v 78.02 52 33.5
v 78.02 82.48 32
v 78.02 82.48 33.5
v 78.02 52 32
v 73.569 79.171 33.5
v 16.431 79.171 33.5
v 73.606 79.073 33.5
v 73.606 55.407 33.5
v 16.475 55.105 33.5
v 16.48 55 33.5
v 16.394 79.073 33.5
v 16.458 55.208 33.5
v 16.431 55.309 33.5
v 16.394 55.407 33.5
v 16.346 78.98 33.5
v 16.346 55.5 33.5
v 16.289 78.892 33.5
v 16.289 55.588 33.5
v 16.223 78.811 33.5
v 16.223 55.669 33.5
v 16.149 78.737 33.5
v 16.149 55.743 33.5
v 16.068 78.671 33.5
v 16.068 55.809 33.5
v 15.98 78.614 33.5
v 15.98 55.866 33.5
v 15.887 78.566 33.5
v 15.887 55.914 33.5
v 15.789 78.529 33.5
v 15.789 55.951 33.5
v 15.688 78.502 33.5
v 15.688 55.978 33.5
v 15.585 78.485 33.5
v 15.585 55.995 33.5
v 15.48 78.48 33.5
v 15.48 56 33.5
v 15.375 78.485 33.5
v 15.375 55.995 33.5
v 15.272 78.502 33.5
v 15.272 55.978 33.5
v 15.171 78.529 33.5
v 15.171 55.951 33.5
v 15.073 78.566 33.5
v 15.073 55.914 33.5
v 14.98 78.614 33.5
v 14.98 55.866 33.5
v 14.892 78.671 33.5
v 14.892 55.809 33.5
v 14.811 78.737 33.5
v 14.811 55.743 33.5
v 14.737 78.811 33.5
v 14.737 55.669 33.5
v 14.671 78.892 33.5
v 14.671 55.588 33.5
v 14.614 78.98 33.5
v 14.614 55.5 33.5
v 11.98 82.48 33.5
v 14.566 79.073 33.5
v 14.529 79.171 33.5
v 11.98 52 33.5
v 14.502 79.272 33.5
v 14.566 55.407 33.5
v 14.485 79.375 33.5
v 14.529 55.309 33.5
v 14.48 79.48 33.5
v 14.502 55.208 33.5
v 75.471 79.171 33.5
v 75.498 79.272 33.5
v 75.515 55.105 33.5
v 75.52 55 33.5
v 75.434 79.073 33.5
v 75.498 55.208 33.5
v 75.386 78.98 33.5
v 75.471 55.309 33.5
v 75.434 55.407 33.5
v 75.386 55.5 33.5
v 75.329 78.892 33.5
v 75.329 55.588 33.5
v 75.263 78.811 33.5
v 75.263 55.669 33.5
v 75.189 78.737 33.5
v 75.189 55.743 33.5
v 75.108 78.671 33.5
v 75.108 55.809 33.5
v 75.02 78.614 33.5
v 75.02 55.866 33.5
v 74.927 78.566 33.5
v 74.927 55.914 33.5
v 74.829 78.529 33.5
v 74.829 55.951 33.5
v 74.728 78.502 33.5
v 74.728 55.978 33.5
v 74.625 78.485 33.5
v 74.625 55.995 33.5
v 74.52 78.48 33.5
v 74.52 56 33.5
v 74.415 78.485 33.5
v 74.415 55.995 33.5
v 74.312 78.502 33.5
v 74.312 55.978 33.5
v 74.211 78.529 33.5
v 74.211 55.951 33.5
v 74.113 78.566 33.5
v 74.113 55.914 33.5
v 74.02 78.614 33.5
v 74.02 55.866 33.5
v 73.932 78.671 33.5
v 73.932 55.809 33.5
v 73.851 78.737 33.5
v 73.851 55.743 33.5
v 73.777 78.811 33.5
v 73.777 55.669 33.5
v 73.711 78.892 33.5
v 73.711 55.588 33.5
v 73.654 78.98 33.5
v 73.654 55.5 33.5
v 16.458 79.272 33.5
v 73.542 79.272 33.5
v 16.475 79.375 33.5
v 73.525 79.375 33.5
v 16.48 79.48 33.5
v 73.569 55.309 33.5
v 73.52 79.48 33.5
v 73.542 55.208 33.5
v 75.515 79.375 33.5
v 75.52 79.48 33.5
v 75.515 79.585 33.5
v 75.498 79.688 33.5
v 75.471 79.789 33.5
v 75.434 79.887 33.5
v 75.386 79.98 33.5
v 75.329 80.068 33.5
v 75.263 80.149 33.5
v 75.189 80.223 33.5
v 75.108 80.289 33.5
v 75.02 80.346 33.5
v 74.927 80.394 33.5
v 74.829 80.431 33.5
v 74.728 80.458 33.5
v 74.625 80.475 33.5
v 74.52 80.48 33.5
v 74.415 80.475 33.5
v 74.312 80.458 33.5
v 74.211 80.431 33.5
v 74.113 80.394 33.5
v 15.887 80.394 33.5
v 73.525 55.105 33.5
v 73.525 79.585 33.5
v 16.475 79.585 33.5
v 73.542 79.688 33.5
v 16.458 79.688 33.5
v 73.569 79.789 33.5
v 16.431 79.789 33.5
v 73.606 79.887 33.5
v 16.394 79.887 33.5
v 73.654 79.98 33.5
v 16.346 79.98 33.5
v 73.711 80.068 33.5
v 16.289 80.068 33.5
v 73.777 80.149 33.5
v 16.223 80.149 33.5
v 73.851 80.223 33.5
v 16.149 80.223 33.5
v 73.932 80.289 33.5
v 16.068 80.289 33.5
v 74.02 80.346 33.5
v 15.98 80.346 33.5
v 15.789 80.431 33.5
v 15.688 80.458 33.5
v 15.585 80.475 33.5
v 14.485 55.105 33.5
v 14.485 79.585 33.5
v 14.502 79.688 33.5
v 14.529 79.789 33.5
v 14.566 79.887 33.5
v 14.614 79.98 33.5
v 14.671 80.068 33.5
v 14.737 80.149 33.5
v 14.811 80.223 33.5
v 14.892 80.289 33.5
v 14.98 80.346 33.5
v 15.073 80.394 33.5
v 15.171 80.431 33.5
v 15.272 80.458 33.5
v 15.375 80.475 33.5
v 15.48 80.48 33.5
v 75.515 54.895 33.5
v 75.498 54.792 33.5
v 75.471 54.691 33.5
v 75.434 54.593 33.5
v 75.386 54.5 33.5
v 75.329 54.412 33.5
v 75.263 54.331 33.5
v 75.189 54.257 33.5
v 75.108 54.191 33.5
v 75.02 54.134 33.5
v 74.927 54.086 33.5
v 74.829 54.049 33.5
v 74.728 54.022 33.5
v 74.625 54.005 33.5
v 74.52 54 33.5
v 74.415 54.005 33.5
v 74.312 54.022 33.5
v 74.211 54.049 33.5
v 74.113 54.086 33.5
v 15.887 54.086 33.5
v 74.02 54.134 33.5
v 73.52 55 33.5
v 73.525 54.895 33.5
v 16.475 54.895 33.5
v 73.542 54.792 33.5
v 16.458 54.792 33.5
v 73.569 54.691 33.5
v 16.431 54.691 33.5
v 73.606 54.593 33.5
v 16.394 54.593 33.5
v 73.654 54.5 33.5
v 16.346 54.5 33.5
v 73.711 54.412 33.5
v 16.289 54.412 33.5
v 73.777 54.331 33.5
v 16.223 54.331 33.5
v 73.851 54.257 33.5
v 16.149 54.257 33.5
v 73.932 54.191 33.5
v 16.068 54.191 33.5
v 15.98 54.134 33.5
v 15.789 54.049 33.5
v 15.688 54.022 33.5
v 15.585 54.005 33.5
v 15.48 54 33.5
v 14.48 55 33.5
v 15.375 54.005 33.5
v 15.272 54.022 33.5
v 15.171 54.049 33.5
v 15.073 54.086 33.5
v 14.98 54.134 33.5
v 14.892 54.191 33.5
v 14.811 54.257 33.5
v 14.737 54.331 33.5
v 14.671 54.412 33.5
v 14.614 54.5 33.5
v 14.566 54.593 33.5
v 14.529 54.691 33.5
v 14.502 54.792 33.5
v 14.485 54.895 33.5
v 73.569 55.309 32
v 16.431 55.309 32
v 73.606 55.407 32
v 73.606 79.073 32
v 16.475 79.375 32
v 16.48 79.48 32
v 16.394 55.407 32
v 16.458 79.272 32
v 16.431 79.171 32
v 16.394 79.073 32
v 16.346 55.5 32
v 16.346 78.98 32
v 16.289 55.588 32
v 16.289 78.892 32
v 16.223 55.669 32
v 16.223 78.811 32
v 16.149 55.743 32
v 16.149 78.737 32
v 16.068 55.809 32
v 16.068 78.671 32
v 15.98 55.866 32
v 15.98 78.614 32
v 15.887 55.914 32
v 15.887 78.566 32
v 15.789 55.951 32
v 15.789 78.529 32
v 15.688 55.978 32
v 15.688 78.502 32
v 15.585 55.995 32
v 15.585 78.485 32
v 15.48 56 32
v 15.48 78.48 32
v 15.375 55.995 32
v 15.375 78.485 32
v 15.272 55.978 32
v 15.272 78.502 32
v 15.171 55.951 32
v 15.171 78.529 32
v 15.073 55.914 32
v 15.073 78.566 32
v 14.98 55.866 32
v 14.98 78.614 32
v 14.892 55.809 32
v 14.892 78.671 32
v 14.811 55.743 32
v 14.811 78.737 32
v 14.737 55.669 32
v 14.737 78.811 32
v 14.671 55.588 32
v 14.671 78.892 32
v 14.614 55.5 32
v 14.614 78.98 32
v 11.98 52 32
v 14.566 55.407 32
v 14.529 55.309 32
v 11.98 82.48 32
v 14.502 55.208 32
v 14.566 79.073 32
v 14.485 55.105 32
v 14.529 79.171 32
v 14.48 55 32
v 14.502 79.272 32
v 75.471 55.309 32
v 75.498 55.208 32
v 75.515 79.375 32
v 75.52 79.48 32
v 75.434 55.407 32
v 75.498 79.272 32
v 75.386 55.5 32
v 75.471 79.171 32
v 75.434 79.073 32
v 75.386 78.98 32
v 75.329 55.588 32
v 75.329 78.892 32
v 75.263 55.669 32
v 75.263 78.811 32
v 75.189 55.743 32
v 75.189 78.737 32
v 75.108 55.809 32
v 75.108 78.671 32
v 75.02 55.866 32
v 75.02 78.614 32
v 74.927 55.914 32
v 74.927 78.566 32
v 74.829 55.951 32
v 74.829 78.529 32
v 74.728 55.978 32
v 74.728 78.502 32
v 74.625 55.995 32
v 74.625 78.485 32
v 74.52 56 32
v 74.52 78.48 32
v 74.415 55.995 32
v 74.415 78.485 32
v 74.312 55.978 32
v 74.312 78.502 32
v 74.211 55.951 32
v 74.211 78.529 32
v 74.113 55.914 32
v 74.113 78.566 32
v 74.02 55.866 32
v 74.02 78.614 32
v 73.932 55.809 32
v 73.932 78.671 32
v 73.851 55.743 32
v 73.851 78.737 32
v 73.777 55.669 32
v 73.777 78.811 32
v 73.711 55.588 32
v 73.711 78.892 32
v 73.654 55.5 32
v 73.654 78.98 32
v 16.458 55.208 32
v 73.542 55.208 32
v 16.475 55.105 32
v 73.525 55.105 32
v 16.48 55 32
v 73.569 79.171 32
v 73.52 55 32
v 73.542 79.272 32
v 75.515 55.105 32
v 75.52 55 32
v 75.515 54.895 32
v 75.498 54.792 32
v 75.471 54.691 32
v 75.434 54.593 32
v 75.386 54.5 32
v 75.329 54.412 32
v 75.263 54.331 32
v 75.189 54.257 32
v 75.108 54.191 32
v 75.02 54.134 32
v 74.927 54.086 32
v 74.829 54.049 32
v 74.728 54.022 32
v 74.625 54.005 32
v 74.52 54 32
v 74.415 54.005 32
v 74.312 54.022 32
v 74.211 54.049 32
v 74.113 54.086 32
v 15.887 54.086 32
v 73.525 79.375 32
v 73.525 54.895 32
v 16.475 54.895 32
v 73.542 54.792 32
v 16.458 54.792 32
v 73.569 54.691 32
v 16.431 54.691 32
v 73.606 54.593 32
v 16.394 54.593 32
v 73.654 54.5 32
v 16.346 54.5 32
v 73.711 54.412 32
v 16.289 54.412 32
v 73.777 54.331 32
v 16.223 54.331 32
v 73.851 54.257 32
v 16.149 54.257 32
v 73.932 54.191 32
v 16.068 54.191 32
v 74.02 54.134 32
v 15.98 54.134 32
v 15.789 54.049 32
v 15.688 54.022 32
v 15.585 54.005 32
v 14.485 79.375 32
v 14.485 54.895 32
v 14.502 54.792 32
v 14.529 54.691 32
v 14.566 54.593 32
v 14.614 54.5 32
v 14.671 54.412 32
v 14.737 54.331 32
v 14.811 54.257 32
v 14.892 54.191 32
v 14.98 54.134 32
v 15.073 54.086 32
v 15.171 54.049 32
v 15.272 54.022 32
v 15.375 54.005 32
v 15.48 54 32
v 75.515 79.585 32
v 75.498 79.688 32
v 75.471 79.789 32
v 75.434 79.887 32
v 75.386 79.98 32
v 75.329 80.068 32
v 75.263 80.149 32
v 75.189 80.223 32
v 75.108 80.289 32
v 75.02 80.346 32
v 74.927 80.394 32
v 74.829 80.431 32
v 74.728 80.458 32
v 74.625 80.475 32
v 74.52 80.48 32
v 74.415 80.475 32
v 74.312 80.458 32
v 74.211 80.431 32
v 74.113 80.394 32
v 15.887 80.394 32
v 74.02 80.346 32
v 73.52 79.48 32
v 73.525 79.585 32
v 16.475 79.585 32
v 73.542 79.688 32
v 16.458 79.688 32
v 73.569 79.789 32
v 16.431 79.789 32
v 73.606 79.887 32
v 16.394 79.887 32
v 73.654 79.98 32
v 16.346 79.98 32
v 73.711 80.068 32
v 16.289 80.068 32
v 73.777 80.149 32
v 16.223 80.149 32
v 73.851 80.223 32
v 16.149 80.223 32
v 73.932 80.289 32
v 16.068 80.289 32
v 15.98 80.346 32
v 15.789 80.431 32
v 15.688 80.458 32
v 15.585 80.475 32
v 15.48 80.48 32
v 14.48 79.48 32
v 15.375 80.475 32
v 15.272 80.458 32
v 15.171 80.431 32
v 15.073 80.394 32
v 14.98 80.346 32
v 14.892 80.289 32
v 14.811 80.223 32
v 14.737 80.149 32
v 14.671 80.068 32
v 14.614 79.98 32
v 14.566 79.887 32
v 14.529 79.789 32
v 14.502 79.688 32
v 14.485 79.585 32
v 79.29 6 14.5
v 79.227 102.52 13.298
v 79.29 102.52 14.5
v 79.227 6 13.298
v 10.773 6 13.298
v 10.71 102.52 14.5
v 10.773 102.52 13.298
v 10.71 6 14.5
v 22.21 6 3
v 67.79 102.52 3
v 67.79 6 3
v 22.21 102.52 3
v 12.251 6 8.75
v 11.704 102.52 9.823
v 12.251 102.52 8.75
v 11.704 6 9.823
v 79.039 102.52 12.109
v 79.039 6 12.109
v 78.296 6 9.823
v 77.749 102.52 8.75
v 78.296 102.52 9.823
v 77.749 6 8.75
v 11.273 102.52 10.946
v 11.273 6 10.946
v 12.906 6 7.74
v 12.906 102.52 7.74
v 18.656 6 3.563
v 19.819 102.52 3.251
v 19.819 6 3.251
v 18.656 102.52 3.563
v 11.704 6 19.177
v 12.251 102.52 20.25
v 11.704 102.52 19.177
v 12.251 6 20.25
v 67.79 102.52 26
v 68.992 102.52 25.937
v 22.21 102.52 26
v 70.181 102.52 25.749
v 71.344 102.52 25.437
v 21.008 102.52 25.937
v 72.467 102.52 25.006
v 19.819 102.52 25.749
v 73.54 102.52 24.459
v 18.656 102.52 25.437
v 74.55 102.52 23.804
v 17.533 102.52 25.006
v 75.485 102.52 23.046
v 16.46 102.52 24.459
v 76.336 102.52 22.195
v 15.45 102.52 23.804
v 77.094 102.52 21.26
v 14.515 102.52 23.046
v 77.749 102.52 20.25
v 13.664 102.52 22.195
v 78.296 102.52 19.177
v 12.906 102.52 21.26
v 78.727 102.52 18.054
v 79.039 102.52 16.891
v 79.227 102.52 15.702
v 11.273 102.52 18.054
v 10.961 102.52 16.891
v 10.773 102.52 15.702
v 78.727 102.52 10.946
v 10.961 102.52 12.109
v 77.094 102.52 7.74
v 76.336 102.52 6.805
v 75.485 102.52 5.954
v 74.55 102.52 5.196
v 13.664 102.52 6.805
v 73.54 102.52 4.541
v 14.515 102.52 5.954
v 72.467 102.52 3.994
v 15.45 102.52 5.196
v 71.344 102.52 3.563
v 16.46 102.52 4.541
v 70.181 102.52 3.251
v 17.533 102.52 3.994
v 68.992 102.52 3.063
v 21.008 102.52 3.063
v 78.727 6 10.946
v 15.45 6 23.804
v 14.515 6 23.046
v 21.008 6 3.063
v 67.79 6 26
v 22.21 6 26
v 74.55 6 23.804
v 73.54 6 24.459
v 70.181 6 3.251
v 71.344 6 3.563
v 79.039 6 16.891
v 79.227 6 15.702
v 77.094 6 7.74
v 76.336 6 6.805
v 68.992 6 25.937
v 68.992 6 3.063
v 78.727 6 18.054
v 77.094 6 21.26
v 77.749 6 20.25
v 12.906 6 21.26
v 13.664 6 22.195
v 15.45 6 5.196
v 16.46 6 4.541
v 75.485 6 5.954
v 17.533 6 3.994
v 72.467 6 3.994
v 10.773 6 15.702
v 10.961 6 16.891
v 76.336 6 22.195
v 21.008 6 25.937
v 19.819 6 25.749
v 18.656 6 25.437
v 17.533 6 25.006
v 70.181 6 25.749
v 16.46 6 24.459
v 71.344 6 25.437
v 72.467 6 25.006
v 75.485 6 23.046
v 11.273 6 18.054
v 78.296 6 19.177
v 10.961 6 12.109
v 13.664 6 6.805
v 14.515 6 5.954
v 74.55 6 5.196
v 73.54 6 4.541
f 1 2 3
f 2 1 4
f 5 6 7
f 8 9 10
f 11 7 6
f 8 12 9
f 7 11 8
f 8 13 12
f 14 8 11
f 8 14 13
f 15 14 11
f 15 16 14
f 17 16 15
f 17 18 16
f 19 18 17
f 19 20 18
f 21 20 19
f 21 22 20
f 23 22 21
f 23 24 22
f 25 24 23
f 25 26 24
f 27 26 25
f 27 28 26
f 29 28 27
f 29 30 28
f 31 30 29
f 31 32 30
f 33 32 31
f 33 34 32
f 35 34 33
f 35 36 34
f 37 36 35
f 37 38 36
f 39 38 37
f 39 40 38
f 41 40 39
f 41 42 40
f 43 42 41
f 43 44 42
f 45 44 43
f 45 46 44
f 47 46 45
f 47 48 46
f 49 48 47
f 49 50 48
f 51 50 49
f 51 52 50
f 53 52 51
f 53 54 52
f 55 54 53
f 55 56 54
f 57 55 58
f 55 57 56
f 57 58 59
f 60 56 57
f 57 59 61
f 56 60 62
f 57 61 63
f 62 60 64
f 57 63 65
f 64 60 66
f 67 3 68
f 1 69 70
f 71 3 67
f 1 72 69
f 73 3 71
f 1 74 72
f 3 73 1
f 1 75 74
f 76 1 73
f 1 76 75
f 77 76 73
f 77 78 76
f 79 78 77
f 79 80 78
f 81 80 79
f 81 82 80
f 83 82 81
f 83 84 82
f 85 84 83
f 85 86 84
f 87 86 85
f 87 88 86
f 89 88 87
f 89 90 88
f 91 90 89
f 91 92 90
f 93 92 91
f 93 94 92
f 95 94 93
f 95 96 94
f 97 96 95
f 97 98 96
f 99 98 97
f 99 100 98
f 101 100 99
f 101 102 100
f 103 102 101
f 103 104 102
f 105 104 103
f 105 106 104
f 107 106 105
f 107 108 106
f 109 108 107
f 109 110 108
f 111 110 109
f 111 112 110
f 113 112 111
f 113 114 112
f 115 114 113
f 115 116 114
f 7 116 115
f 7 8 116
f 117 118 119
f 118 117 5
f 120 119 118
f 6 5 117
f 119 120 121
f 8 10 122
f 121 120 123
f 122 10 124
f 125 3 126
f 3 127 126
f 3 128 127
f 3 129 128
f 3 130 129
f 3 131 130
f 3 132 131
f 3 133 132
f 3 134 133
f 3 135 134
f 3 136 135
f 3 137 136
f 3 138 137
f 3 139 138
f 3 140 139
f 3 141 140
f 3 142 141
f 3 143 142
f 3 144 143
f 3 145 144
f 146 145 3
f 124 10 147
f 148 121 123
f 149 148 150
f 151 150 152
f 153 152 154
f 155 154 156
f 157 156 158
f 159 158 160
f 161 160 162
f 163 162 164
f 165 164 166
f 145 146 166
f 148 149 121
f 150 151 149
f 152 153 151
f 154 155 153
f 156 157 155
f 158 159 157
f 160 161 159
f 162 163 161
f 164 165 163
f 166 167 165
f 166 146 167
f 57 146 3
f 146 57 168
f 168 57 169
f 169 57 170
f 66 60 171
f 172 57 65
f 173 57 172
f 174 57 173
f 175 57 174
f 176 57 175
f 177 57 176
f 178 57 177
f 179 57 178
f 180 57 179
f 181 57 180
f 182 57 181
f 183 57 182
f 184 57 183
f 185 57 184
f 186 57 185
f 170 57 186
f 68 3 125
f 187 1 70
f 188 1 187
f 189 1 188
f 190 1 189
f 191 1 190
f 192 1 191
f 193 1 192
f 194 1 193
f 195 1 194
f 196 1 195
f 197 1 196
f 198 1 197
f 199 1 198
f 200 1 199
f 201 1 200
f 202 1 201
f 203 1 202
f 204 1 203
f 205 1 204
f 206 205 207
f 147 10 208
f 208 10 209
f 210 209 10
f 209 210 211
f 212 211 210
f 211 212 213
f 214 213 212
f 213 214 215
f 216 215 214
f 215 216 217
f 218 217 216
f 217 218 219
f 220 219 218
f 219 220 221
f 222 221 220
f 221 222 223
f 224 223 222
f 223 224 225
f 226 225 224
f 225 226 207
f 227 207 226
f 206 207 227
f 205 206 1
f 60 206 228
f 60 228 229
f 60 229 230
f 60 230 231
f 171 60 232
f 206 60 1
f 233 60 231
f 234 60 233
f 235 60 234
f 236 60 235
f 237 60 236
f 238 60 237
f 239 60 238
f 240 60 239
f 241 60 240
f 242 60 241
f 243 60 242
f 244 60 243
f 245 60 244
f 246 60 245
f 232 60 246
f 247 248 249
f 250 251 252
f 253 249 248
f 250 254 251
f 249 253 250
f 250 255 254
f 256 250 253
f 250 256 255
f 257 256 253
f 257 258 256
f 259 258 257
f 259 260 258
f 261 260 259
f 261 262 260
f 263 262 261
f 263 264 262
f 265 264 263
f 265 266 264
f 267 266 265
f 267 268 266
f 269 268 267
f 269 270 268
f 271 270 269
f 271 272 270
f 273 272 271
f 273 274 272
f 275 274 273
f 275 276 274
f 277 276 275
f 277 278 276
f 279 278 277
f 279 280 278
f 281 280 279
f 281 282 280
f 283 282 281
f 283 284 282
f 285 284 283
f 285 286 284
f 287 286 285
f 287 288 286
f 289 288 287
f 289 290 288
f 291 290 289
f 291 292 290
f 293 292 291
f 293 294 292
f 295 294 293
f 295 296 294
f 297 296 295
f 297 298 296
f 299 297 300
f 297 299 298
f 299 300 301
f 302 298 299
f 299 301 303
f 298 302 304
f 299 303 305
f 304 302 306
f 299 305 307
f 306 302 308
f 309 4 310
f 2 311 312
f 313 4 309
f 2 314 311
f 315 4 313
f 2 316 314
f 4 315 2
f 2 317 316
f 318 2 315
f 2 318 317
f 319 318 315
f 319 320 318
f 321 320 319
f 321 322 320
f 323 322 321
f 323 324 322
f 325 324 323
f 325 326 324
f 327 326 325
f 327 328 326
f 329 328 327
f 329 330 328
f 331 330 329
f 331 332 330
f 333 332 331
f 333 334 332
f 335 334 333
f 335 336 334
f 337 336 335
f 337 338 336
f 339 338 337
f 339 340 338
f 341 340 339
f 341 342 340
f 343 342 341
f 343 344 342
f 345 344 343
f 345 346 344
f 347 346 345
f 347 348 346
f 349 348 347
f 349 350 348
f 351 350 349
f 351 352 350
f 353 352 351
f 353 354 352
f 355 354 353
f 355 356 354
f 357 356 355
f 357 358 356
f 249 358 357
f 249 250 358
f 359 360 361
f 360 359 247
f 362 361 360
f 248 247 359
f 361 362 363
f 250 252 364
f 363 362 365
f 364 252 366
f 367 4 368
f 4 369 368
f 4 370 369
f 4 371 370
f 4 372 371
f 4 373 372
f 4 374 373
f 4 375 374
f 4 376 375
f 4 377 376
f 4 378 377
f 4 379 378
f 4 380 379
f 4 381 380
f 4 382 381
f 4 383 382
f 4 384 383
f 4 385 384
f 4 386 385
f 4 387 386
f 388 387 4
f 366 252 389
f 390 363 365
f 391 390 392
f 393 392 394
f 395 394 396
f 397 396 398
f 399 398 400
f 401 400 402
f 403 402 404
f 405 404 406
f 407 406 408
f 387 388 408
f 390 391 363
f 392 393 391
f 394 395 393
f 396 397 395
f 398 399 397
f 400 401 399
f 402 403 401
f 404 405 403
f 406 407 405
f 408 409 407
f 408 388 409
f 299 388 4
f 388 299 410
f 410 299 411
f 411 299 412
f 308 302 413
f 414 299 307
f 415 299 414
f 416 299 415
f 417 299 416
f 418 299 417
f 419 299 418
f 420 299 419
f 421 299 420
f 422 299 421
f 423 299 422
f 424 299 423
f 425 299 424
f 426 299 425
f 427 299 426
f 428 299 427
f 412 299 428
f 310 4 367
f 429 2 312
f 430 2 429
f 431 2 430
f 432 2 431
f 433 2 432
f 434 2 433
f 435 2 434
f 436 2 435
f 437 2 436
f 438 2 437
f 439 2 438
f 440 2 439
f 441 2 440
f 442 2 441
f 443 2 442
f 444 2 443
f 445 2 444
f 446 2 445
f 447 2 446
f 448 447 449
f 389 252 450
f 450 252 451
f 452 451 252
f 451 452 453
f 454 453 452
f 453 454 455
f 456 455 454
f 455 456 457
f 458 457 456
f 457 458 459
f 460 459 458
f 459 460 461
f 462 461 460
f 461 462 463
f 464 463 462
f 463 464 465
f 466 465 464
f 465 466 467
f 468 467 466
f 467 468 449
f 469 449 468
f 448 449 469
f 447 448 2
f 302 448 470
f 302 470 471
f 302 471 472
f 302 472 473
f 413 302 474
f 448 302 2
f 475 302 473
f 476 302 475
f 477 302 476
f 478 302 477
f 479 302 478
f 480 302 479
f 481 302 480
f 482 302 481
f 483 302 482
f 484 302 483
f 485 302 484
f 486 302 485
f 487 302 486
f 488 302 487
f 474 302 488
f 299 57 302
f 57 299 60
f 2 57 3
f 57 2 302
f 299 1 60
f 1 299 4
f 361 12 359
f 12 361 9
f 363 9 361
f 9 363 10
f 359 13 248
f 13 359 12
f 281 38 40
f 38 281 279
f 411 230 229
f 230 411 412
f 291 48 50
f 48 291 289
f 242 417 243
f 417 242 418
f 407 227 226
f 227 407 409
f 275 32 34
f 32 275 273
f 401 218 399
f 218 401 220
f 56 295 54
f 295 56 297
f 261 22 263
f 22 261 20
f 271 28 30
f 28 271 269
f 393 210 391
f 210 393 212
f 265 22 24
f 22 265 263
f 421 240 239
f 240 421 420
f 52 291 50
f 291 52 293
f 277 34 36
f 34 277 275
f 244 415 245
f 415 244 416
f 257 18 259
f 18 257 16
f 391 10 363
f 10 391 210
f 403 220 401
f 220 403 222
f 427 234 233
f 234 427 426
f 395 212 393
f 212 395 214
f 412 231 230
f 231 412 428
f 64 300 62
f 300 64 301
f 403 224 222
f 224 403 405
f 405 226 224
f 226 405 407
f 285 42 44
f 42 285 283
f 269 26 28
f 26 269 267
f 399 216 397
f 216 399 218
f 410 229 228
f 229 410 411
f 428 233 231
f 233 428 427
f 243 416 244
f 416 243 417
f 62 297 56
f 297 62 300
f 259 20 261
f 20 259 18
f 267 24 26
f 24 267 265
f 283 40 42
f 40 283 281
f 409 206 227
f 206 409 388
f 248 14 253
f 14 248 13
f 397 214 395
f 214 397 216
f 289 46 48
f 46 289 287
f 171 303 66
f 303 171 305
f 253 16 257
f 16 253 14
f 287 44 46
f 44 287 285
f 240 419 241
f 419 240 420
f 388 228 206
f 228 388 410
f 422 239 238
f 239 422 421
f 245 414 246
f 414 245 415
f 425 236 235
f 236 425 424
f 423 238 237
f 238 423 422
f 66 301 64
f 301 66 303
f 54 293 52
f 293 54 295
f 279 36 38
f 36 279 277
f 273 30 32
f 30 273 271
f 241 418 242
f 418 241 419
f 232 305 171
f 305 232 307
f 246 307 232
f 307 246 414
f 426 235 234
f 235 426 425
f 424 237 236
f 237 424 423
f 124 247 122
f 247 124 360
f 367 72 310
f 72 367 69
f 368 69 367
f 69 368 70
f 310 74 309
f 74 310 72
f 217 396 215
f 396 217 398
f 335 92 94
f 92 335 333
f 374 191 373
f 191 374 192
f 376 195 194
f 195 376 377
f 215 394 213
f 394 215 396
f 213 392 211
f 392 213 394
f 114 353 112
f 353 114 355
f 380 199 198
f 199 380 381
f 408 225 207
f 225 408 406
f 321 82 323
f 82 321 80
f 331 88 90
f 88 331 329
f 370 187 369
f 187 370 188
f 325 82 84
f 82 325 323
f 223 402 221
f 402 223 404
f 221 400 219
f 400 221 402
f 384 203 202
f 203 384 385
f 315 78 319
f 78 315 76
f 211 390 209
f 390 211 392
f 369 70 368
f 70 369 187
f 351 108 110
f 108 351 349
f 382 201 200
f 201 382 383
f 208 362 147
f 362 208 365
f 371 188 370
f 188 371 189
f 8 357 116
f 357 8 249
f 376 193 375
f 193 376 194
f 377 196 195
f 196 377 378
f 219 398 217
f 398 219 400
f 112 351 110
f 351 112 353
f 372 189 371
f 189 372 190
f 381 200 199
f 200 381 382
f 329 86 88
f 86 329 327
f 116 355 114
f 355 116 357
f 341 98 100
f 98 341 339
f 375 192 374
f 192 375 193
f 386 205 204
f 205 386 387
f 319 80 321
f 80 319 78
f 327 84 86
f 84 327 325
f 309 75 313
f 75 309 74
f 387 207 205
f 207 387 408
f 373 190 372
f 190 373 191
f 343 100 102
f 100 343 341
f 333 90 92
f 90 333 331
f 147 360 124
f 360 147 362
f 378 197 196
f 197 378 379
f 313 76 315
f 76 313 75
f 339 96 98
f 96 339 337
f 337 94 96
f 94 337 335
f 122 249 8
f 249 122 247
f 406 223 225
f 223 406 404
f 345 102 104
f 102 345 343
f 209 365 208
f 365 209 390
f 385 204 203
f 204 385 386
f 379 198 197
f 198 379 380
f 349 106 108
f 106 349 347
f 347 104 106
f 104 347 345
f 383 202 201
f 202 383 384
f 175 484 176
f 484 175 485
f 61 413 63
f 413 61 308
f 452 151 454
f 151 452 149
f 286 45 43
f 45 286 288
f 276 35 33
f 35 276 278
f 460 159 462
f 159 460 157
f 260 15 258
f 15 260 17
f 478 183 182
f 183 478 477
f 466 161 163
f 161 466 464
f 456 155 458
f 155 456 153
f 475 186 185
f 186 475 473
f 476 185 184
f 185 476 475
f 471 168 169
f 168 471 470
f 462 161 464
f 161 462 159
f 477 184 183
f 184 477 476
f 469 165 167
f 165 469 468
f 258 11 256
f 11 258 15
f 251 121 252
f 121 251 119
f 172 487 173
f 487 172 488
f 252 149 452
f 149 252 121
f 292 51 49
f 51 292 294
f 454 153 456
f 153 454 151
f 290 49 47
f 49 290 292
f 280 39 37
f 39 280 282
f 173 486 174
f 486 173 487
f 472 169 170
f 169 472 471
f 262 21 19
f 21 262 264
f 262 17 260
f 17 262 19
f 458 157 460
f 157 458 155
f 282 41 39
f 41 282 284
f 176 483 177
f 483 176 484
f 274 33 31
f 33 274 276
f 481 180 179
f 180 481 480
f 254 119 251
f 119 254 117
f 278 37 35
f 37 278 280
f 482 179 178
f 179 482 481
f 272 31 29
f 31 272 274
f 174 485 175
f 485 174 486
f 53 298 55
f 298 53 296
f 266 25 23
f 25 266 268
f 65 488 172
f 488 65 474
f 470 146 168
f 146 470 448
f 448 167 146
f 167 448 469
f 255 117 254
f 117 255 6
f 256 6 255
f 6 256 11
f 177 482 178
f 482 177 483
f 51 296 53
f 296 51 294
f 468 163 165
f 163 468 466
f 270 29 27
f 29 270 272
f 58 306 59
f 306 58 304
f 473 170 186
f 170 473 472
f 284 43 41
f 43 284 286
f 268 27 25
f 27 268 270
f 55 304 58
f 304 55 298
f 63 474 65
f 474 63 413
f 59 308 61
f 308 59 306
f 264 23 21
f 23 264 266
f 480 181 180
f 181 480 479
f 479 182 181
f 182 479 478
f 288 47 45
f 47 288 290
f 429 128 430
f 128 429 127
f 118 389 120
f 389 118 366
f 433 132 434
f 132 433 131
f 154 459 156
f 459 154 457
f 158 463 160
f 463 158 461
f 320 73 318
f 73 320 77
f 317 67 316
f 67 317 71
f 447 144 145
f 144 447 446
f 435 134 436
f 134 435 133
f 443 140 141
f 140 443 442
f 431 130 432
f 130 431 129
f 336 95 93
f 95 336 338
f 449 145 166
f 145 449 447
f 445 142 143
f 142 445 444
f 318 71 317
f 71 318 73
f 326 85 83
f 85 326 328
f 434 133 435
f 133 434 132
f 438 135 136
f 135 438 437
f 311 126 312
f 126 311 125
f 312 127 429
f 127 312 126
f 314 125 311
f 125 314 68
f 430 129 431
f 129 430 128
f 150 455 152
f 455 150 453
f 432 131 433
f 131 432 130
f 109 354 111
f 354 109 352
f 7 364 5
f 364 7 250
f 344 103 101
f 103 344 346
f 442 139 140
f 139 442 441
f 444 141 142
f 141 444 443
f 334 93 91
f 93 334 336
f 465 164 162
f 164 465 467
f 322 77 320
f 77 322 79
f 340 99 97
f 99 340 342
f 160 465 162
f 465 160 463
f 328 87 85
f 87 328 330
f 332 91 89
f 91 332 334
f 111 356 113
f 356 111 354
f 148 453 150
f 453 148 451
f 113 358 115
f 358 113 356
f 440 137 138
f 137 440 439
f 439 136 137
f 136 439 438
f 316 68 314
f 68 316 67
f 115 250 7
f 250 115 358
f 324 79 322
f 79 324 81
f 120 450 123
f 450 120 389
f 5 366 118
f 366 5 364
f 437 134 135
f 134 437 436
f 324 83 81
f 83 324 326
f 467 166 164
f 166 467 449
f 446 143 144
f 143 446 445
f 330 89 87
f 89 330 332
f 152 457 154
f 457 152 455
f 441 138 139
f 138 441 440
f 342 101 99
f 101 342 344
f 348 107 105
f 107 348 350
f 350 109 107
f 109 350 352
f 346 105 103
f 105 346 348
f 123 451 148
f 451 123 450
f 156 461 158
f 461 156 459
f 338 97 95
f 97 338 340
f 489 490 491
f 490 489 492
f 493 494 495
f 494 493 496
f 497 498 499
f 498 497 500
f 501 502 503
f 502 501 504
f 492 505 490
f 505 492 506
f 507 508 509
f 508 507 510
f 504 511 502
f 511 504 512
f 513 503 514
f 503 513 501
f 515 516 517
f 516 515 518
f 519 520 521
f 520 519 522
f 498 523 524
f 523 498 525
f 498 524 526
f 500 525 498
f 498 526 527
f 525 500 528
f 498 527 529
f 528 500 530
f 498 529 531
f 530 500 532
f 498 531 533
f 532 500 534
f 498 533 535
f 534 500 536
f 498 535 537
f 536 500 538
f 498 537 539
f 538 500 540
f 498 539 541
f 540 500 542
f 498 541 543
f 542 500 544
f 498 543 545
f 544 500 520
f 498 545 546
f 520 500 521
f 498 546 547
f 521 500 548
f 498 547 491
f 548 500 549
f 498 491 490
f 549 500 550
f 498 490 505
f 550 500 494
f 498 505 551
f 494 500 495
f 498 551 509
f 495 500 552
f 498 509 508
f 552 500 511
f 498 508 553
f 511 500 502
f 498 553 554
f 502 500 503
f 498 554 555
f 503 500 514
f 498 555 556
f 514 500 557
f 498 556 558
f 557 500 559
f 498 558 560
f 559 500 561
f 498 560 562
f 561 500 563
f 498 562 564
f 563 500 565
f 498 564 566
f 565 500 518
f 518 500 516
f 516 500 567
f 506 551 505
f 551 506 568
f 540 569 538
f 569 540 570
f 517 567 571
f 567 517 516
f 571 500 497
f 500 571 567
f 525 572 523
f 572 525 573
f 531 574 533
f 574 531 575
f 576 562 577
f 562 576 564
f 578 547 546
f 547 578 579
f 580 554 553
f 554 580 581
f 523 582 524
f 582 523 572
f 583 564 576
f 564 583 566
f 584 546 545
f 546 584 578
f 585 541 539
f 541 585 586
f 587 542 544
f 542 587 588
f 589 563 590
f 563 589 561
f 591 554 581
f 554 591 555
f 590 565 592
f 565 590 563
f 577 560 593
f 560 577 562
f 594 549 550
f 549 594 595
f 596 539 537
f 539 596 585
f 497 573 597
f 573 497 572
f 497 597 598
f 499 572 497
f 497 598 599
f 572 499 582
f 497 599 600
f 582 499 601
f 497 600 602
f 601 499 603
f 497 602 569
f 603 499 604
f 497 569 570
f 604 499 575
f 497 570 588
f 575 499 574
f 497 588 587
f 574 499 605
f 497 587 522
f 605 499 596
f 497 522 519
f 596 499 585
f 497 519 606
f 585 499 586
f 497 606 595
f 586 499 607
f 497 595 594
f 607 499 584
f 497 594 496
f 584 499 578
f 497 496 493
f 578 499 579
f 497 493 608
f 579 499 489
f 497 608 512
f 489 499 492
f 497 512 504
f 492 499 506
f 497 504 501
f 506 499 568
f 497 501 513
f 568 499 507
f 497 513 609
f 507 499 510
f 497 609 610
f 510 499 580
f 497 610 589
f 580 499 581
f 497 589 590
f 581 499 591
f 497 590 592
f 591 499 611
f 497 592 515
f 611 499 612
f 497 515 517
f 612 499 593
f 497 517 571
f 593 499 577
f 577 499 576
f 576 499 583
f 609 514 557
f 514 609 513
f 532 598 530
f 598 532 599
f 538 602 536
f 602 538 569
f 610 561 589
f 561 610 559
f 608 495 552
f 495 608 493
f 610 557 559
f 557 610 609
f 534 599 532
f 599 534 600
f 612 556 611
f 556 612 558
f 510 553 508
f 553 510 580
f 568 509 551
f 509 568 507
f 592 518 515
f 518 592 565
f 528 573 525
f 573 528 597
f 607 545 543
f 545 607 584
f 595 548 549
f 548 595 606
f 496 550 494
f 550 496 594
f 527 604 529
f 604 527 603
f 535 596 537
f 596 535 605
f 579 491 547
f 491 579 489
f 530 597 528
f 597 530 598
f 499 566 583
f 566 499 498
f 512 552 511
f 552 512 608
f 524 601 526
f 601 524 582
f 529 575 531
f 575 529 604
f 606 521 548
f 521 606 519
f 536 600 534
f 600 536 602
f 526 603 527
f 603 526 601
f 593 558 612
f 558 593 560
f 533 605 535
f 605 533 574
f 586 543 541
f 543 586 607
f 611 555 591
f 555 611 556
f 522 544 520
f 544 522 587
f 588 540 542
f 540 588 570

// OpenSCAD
// file: _selector_params.scad
// Ansible widget cases
//
// Parameters specific to selector types
// -----------------------------------------------------------------------------

// Magnet selector

MAGNET_BOARD_WIDTH = 23;
MAGNET_BOARD_HEIGHT = 21;

MAGNET_HOLE_OFFSET = 2;
MAGNET_HOLE_WIDTH = MAGNET_BOARD_WIDTH - MAGNET_HOLE_OFFSET;
MAGNET_HOLE_LENGTH = 10.5;

MAGNET_BOARD_INSET = 1;
MAGNET_BOARD_INSET_WIDTH = MAGNET_BOARD_WIDTH + MAGNET_BOARD_INSET;
MAGNET_BOARD_INSET_HEIGHT = MAGNET_BOARD_HEIGHT + MAGNET_BOARD_INSET;
MAGNET_BOARD_INSET_DEPTH = 1;

MAGNET_PEG_HEIGHT = 4;
MAGNET_PEG_RADIUS_BASE = 2.5 / 2;
MAGNET_PEG_RADIUS_TOP = 1.75 / 2;
MAGNET_PEG_OFFSET_X = -0.25;
MAGNET_PEG_OFFSET_Y = 0.7;
MAGNET_PEG_OFFSET_Z = -MAGNET_BOARD_INSET;

MAGNET_PEG_HOLE_RADIUS = 2.5 / 2;
MAGNET_PEG_HOLE_OFFSET_X = 1 + MAGNET_PEG_HOLE_RADIUS;
MAGNET_PEG_HOLE_OFFSET_Y = 1 + MAGNET_PEG_HOLE_RADIUS;

// -----------------------------------------------------------------------------

// Light selector

LIGHT_BOARD_WIDTH = 19;
LIGHT_BOARD_HEIGHT = 16;

LIGHT_HOLE_OFFSET = 2;
LIGHT_HOLE_WIDTH = LIGHT_BOARD_WIDTH - LIGHT_HOLE_OFFSET;
LIGHT_HOLE_LENGTH = 8;

LIGHT_BOARD_INSET = 1;
LIGHT_BOARD_INSET_WIDTH = LIGHT_BOARD_WIDTH + LIGHT_BOARD_INSET;
LIGHT_BOARD_INSET_HEIGHT = LIGHT_BOARD_HEIGHT + LIGHT_BOARD_INSET;
LIGHT_BOARD_INSET_DEPTH = 1;

LIGHT_PEG_HEIGHT = 4;
LIGHT_PEG_RADIUS_BASE = 2.5 / 2;
LIGHT_PEG_RADIUS_TOP = 1.75 / 2;
LIGHT_PEG_OFFSET_X = 1.65;
LIGHT_PEG_OFFSET_Y = 3.65;
LIGHT_PEG_OFFSET_Z = -LIGHT_BOARD_INSET;

LIGHT_PEG_HOLE_RADIUS = 2.3 / 2;
LIGHT_PEG_HOLE_OFFSET_X = 1 + LIGHT_PEG_HOLE_RADIUS;
LIGHT_PEG_HOLE_OFFSET_Y = 1.5 + LIGHT_PEG_HOLE_RADIUS;
// file: _widget_params.scad
// Ansible widget cases
//
// Parameters specific to widget types
// -----------------------------------------------------------------------------

// LED widget

LED_LEAD_DISTANCE = 2.5; // 2.5mm apart

LED_HOLE_RADIUS = 1.5 / 2;

LED_SHELF_WIDTH = 3;
LED_SHELF_HEIGHT = 7;

LED_SHELF_X = 23;
LED_SHELF_Y = 5;

LED_SHELF2_X = 5;
LED_SHELF2_Y = 5;
// file: params.scad
// Ansible widget cases
//
// Params: case parameters
// -----------------------------------------------------------------------------

// Overall case
CASE_WIDTH = 90;
CASE_LENGTH = 140;
CASE_HEIGHT = 55;
WALL_THICKNESS = 3;
FLOOR_THICKNESS = WALL_THICKNESS;
SEGMENTS = 60;

// -----------------------------------------------------------------------------

// Front door
FRONT_DOOR_THICKNESS = 3;
FRONT_DOOR_INSET = 1;  // how much gap to give
FRONT_DOOR_OFFSET_Y = 4; // how far in from the edge
FRONT_DOOR_WIDTH = CASE_WIDTH - WALL_THICKNESS - FRONT_DOOR_INSET;
FRONT_DOOR_HEIGHT = CASE_HEIGHT - (WALL_THICKNESS * 2) + (FRONT_DOOR_INSET * 2);

// -----------------------------------------------------------------------------

// Pi shelf
SHELF_THICKNESS = WALL_THICKNESS - 1;
SHELF_Y = 47;
SHELF_LENGTH = 35;
SHELF_HEIGHT = 28;
SHELF_PEG_OFFSET_X = 3.5;
SHELF_PEG_OFFSET_Y = 3.0;
SHELF_PEG_HEIGHT = 4;
SHELF_PEG_RADIUS_BASE = 2.5 / 2;
SHELF_PEG_RADIUS_TOP = 1.75 / 2;

SHELF_HOLE_WIDTH = CASE_WIDTH * 0.5;
SHELF_HOLE_LENGTH = SHELF_LENGTH * 0.6;
SHELF_HOLE_OFFSET_Y = 8;

// -----------------------------------------------------------------------------

// Lid
LID_THICKNESS = 2;
DOCK_BORDER_HEIGHT = 9;
DOCK_BORDER_THICKNESS = 2;
DOCK_INSET = 2;

// Lid ridge
RIDGE_THICKNESS = WALL_THICKNESS * 2;
RIDGE_PEG_HEIGHT = 4;
RIDGE_PEG_RADIUS_BASE = 2.5 / 2;
RIDGE_PEG_RADIUS_TOP = 1.75 / 2;
RIDGE_PEG_RADIUS_HOLE = 2.3 / 2;
RIDGE_PEG_OFFSET = 5;

// -----------------------------------------------------------------------------

// General mount
MOUNT_HEIGHT = 15;
MOUNT_THICKNESS = 3;
MOUNT_SEGMENTS = 360;
GRIP_HEIGHT = 3;
GRIP_THICKNESS = 2;
LABEL_MOUNT_HEIGHT = 1;
LABEL_MOUNT_FONT_SIZE = 6;
LABEL_MOUNT_FONT = "Avenir Pro:style=Bold";

// Selector dock
SELECTOR_DOCK_Y = CASE_LENGTH * .78;
SELECTOR_DOCK_RADIUS = 18;
SELECTOR_DOCK_BORDER_RADIUS = SELECTOR_DOCK_RADIUS + DOCK_BORDER_THICKNESS;
SELECTOR_HOLE_OFFSET = DOCK_BORDER_THICKNESS;
SELECTOR_HOLE_SIZE = SELECTOR_DOCK_RADIUS - SELECTOR_HOLE_OFFSET;
SELECTOR_LABEL_Y = -SELECTOR_DOCK_RADIUS + 1;

// Selector mount
SELECTOR_MOUNT_COLOR = [0.6, 0.6, 0.8];
SELECTOR_MOUNT_OFFSET = 0.5;
SELECTOR_MOUNT_THICKNESS = WALL_THICKNESS;
SELECTOR_MOUNT_RADIUS = SELECTOR_DOCK_RADIUS - SELECTOR_MOUNT_OFFSET;
SELECTOR_HOLE_RADIUS = SELECTOR_MOUNT_RADIUS - SELECTOR_HOLE_OFFSET;

SELECTOR_MOUNT_NOTCH_SIZE = 15;
SELECTOR_MOUNT_NOTCH_HEIGHT = MOUNT_HEIGHT - 5;

// Widget dock
WIDGET_DOCK_Y = CASE_LENGTH * .15;
WIDGET_DOCK_SIZE = 32;
WIDGET_BORDER_RADIUS = 2.5;
WIDGET_HOLE_OFFSET = DOCK_BORDER_THICKNESS * 2;
WIDGET_HOLE_SIZE = WIDGET_DOCK_SIZE - WIDGET_HOLE_OFFSET;

// Widget mount
WIDGET_MOUNT_COLOR = [0.6, 0.8, 0.6];
WIDGET_MOUNT_OFFSET = 1;
WIDGET_MOUNT_THICKNESS = 2;
WIDGET_MOUNT_SIZE = WIDGET_DOCK_SIZE - WIDGET_MOUNT_OFFSET;
WIDGET_MOUNT_HOLE_SIZE = WIDGET_MOUNT_SIZE - WIDGET_HOLE_OFFSET;

WIDGET_MOUNT_NOTCH_SIZE = 15;
WIDGET_MOUNT_NOTCH_HEIGHT = MOUNT_HEIGHT - 5;

// -----------------------------------------------------------------------------

// Pi
PI_COLOR = [0.3, 0.4, 0.3];
PI_Y = SHELF_Y + 5;
PI_WIDTH = 66.04;
PI_LENGTH = 30.48;
PI_DEPTH = 1.5;
PI_HOLE_RADIUS = 2 / 2;
PI_HOLE_OFFSET_X = 3.5;
PI_HOLE_OFFSET_Y = 3.0;

// Battery pack
BATTERY_COLOR = [0.2, 0.2, 0.2];
BATTERY_WIDTH = 68.58;
BATTERY_LENGTH = 96.52;
BATTERY_DEPTH = 22.86;

BATTERY_DIAMETER = 23;

BATTERY_GUIDE_OFFSET_X = -5.5;
BATTERY_GUIDE_WIDTH = 4;
BATTERY_GUIDE_HEIGHT = 4;
BATTERY_GUIDE_OFFSET_Y = 30;
BATTERY_GUIDE_LENGTH = 40;

// -----------------------------------------------------------------------------

// Floor hole
FLOOR_HOLE_WIDTH = BATTERY_WIDTH * .6;
FLOOR_HOLE_LENGTH = BATTERY_LENGTH * .8;

// -----------------------------------------------------------------------------

// Hatching

HATCH_FRAME_OFFSET = 5;
HATCH_SIZE = 6;
HATCH_GAP = 10;
SIDE_HATCH_LENGTH = CASE_LENGTH - 15;

// -----------------------------------------------------------------------------

include <_widget_params.scad>;
include <_selector_params.scad>;
// main file
// Ansible widget cases
//
// Misc: Battery pack and Raspberry Pi (not printed)
// -----------------------------------------------------------------------------

include <params.scad>;

// -----------------------------------------------------------------------------

module pack_and_pi() {
	battery_pack();
	raspberry_pi();
}

// -----------------------------------------------------------------------------

module battery_pack() {
    color(BATTERY_COLOR) {
        translate([
			// Center it
			(CASE_WIDTH / 2) - (BATTERY_WIDTH / 2),
			// Move it in a little bit
			WALL_THICKNESS * 2,
			// Sit it directly on the floor
			WALL_THICKNESS + BATTERY_DIAMETER / 2
		])
			rotate([-90, 0, 0])
			linear_extrude(BATTERY_LENGTH)
			hull() {
				translate([BATTERY_DIAMETER / 2, 0, 0])
					circle(BATTERY_DIAMETER / 2, $fn=SEGMENTS);

				translate([BATTERY_WIDTH - BATTERY_DIAMETER / 2, 0, 0])
					circle(BATTERY_DIAMETER / 2, $fn=SEGMENTS);
			}
    }
}

// -----------------------------------------------------------------------------

module raspberry_pi() {
    color(PI_COLOR) {
        translate([
			// Center it
			(CASE_WIDTH / 2) - (PI_WIDTH / 2),
			// How far down the case it should go
			PI_Y,
			// Put it on the shelf (with the shelf thickness taken into
			// account) and a little extra since it won't sit flush
			SHELF_HEIGHT + SHELF_THICKNESS + 2
		])
			difference() {
				// Base Pi
				cube([
					PI_WIDTH,
					PI_LENGTH,
					PI_DEPTH
				]);

				// Peg holes
				translate([
					PI_HOLE_OFFSET_X,
					PI_HOLE_OFFSET_Y,
					-5
				])
					cylinder(10, PI_HOLE_RADIUS, PI_HOLE_RADIUS, $fn=SEGMENTS);

				translate([
					PI_WIDTH - PI_HOLE_OFFSET_X,
					PI_HOLE_OFFSET_Y,
					-5
				])
					cylinder(10, PI_HOLE_RADIUS, PI_HOLE_RADIUS, $fn=SEGMENTS);

				translate([
					PI_HOLE_OFFSET_X,
					PI_LENGTH - PI_HOLE_OFFSET_Y,
					-5
				])
					cylinder(10, PI_HOLE_RADIUS, PI_HOLE_RADIUS, $fn=SEGMENTS);

				translate([
					PI_WIDTH - PI_HOLE_OFFSET_X,
					PI_LENGTH - PI_HOLE_OFFSET_Y,
					-5
				])
					cylinder(10, PI_HOLE_RADIUS, PI_HOLE_RADIUS, $fn=SEGMENTS);
			}
    }
}

// -----------------------------------------------------------------------------

pack_and_pi();
